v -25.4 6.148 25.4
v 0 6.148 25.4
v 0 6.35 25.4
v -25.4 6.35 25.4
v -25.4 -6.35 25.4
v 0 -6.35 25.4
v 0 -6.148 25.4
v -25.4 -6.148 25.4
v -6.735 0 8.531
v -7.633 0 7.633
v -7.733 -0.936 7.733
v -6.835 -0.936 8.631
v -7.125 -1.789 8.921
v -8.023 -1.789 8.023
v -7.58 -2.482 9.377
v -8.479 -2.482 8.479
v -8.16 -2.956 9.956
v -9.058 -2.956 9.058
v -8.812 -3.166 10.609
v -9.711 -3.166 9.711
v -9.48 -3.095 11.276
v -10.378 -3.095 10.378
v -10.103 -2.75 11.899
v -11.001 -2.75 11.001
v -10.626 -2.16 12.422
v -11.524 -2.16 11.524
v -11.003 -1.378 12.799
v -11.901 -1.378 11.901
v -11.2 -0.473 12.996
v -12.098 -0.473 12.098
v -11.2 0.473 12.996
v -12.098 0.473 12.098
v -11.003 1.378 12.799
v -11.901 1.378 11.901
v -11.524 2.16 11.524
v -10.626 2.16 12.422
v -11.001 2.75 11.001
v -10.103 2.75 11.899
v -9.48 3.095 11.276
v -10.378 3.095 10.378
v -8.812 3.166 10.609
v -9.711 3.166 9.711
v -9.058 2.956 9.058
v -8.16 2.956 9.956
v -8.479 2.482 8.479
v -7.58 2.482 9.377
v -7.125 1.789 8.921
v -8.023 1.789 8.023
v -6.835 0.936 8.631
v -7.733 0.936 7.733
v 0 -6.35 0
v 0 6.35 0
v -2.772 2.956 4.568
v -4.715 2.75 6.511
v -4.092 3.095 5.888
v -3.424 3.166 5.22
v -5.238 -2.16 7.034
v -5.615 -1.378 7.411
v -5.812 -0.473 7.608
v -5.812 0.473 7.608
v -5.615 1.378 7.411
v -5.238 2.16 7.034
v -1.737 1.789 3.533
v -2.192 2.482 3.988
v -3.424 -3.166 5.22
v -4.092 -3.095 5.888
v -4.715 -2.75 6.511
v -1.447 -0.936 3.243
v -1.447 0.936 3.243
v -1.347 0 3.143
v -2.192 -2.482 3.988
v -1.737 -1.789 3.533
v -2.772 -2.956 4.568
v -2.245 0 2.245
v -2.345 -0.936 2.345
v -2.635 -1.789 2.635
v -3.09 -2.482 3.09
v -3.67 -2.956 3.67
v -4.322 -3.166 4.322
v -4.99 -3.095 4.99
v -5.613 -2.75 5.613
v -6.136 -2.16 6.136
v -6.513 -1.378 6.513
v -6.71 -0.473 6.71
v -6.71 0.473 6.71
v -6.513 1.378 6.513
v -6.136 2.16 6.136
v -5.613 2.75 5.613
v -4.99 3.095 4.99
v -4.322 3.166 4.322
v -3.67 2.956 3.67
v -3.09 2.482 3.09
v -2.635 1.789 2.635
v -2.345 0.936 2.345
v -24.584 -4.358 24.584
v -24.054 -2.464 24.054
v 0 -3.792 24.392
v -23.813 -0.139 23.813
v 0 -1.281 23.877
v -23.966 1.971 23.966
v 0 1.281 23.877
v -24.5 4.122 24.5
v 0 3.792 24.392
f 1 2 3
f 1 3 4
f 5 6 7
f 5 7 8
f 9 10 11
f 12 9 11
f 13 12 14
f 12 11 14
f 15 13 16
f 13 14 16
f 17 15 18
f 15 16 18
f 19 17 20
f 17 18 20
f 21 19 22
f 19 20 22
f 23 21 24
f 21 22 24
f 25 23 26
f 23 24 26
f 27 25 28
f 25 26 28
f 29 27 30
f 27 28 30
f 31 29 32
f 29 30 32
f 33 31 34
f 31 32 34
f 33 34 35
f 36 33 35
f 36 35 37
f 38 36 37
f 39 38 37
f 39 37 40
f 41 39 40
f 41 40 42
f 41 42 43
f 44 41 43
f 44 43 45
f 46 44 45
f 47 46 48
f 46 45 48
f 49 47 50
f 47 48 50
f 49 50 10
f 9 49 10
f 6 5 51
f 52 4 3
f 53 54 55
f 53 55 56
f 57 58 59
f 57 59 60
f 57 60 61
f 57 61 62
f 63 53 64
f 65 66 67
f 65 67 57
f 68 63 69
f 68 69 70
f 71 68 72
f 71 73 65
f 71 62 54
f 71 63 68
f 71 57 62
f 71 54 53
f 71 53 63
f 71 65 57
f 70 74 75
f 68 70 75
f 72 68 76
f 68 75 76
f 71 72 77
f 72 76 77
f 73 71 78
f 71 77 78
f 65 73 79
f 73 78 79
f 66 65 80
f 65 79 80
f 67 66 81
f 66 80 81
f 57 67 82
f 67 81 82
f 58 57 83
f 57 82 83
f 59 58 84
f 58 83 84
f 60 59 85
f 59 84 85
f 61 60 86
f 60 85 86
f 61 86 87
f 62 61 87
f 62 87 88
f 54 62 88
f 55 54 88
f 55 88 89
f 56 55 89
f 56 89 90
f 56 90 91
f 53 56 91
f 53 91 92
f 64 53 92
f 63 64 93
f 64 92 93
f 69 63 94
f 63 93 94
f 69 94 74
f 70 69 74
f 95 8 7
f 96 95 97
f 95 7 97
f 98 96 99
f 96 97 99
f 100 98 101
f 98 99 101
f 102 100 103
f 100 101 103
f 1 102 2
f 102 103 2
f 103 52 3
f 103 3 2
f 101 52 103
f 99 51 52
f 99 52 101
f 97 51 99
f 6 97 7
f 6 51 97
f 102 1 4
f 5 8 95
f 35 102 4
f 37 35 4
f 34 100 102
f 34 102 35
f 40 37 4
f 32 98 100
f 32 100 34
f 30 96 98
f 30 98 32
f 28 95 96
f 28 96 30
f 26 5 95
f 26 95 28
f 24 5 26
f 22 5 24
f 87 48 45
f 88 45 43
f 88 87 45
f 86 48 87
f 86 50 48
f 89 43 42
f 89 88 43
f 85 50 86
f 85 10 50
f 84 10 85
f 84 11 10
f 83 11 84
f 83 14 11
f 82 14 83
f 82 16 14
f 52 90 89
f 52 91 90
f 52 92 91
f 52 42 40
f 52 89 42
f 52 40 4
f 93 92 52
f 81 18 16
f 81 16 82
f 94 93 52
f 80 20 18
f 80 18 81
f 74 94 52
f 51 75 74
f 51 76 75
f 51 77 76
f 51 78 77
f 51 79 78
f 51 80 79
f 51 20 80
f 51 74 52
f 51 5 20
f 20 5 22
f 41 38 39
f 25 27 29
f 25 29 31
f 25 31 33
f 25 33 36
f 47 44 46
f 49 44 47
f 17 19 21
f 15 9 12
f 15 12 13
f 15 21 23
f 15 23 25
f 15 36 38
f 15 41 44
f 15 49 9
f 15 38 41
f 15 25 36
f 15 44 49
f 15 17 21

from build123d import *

# Parameters (mm, degrees)
F1_DEPTH = 6.35
F2_R     = 3.175
F3_DEPTH = 1.27
F5_DEPTH = 25.4


with BuildPart() as f1:
    # F0 (on Front) → F1 (new body, symmetric)
    with BuildSketch(Plane.XZ):
        Polygon((-25.4, 25.4), (0, 0), (0, 25.4), align=None)
    extrude(amount=F1_DEPTH, both=True)

    # F2 (on face) → F3 (cut)
    with BuildSketch(Plane(origin=(0, 0, 0), x_dir=(0.7071067812, 0, -0.7071067812), z_dir=(-0.7071067812, 0, -0.7071067812))):
        with Locations((-13.97, 0)):
            Circle(F2_R)
        with Locations((-6.35, 0)):
            Circle(F2_R)
    extrude(amount=-F3_DEPTH, mode=Mode.SUBTRACT)

    # F4 (on face) → F5 (cut)
    with BuildSketch(Plane.YZ):
        with BuildLine():
            ThreePointArc((6.1483610621, 25.4), (10.9401596307, 30.0624684299), (12.7, 36.5125))
            ThreePointArc((12.7, 36.5125), (-6.4500315701, 47.4526596307), (-6.1483610621, 25.4))
            Line((-6.1483610621, 25.4), (6.1483610621, 25.4))
        make_face()
        with BuildLine():
            Line((6.1483610621, 25.4), (-6.1483610621, 25.4))
            ThreePointArc((-6.1483610621, 25.4), (0, 23.8125), (6.1483610621, 25.4))
        make_face()
    extrude(amount=-F5_DEPTH, mode=Mode.SUBTRACT)


solid = f1.part
